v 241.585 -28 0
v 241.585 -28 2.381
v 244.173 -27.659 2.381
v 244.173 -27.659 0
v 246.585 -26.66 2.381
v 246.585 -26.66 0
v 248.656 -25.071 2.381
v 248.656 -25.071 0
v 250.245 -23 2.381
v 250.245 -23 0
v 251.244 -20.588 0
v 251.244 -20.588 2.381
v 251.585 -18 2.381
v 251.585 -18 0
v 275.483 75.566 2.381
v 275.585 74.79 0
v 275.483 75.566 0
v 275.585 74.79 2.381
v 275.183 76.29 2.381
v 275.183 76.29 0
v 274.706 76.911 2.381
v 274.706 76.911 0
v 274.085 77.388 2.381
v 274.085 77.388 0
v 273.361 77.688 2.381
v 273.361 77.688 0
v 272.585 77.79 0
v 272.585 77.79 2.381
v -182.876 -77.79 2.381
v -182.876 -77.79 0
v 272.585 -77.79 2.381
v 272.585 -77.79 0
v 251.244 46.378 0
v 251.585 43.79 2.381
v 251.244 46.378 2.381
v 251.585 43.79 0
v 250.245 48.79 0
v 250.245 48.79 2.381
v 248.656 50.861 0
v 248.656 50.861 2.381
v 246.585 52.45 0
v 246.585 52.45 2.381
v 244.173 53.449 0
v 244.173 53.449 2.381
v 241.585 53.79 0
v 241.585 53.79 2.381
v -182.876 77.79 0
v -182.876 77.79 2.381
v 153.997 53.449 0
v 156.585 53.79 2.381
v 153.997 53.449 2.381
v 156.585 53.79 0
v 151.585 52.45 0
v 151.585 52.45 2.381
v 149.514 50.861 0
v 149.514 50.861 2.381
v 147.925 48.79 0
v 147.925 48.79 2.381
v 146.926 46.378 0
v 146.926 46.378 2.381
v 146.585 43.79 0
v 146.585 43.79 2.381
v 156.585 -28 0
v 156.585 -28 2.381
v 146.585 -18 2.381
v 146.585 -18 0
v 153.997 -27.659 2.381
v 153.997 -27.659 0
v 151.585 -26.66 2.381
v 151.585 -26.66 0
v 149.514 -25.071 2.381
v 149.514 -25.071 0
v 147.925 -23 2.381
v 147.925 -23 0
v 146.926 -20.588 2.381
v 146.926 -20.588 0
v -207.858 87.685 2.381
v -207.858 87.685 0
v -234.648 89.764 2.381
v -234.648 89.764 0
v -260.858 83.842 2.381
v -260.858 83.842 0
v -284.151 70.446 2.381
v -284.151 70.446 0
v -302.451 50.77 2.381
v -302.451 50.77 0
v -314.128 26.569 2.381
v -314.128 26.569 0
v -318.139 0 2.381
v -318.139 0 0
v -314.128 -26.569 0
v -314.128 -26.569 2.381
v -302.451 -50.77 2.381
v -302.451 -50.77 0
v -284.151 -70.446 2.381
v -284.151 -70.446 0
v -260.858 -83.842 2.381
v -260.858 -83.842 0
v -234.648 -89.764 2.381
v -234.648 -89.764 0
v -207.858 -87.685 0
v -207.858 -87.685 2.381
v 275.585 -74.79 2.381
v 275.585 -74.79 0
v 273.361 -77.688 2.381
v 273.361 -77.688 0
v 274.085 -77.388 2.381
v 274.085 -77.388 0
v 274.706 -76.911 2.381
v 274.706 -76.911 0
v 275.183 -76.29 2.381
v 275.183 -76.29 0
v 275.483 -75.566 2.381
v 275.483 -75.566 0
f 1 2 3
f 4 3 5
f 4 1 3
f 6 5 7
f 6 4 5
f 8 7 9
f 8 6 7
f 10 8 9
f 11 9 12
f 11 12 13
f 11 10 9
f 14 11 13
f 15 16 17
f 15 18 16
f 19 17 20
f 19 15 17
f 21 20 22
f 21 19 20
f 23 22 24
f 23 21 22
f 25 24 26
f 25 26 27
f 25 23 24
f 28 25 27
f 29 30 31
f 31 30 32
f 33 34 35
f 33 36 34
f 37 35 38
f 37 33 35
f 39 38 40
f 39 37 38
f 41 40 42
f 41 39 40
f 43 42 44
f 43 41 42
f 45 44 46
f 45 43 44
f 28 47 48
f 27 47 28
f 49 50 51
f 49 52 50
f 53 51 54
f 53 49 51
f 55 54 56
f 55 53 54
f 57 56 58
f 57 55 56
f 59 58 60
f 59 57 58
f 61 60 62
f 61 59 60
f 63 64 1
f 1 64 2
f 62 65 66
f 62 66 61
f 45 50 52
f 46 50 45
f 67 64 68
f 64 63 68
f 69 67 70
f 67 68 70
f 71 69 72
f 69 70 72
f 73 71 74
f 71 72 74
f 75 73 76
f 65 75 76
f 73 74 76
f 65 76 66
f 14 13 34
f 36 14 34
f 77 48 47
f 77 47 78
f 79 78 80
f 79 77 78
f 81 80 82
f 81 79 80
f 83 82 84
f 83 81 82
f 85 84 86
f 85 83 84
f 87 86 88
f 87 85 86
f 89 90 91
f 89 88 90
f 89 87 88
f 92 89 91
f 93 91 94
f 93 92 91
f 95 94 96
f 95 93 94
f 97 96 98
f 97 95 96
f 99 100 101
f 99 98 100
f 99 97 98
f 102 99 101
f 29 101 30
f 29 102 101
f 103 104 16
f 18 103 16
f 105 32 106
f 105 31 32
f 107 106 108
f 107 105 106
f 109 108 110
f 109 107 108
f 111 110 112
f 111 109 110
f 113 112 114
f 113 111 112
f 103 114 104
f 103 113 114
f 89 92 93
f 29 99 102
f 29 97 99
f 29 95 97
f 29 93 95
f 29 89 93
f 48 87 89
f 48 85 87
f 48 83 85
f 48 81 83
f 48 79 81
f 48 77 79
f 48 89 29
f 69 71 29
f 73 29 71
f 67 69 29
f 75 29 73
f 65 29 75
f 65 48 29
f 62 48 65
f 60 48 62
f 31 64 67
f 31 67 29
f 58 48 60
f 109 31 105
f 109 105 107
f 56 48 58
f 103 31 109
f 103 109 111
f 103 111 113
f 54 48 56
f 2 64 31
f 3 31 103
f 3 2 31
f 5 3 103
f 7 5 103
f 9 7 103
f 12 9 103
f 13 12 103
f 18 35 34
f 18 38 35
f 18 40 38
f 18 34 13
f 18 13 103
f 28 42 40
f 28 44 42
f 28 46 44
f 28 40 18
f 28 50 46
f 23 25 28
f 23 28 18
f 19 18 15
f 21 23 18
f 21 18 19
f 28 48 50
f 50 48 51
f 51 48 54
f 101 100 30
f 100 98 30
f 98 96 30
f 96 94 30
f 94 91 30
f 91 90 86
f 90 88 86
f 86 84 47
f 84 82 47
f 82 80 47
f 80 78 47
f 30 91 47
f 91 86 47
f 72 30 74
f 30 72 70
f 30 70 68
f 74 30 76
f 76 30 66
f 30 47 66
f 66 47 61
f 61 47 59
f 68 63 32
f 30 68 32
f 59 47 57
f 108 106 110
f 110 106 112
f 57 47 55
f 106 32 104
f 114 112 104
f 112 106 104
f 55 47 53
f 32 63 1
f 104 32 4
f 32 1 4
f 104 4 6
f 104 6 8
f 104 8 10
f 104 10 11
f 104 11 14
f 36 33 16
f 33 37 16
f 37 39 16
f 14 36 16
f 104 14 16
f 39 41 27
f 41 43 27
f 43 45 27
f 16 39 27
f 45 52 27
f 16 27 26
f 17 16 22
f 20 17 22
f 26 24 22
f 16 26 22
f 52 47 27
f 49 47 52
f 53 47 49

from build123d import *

# Parameters (mm, degrees)
F0_W     = 551.17
F0_H     = 155.58
F1_DEPTH = 2.38125
F2_R     = 3
F3_W     = 105
F3_H     = 81.79
F4_DEPTH = 25
F5_R     = 10
F6_R     = 90
F7_DEPTH = 2.38125


# Not quite as in the source:
# - a length typed as a fraction of an inch, garbled in the dataset ("3 / 203.2 mm" for 3/8 in), is restored


with BuildPart() as f1:
    # F0 (on Top) → F1 (new body)
    with BuildSketch(Plane.XY):
        Rectangle(F0_W, F0_H)
    extrude(amount=F1_DEPTH)

    # F2
    f2_edges = [f1.edges().sort_by_distance(p)[0] for p in [
        (275.585, -77.79, 1.190625),
        (-275.585, -77.79, 1.190625),
        (-275.585, 77.79, 1.190625),
        (275.585, 77.79, 1.190625),
    ]]
    fillet(f2_edges, radius=F2_R)

    # F3 (on face) → F4 (cut)
    with BuildSketch(Plane.XY.offset(2.38125)):
        with Locations((199.085, 12.895)):
            Rectangle(F3_W, F3_H)
    extrude(amount=-F4_DEPTH, mode=Mode.SUBTRACT)

    # F5
    f5_edges = [f1.edges().sort_by_distance(p)[0] for p in [
        (146.585, 53.79, 1.190625),
        (146.585, -28, 1.190625),
        (251.585, 53.79, 1.190625),
        (251.585, -28, 1.190625),
    ]]
    fillet(f5_edges, radius=F5_R)

    # F6 (on face) → F7 (join, through all)
    with BuildSketch(Plane.XY.offset(2.38125)):
        with Locations((-228.1388989337, 0)):
            Circle(F6_R)
    extrude(amount=-F7_DEPTH)


solid = f1.part
